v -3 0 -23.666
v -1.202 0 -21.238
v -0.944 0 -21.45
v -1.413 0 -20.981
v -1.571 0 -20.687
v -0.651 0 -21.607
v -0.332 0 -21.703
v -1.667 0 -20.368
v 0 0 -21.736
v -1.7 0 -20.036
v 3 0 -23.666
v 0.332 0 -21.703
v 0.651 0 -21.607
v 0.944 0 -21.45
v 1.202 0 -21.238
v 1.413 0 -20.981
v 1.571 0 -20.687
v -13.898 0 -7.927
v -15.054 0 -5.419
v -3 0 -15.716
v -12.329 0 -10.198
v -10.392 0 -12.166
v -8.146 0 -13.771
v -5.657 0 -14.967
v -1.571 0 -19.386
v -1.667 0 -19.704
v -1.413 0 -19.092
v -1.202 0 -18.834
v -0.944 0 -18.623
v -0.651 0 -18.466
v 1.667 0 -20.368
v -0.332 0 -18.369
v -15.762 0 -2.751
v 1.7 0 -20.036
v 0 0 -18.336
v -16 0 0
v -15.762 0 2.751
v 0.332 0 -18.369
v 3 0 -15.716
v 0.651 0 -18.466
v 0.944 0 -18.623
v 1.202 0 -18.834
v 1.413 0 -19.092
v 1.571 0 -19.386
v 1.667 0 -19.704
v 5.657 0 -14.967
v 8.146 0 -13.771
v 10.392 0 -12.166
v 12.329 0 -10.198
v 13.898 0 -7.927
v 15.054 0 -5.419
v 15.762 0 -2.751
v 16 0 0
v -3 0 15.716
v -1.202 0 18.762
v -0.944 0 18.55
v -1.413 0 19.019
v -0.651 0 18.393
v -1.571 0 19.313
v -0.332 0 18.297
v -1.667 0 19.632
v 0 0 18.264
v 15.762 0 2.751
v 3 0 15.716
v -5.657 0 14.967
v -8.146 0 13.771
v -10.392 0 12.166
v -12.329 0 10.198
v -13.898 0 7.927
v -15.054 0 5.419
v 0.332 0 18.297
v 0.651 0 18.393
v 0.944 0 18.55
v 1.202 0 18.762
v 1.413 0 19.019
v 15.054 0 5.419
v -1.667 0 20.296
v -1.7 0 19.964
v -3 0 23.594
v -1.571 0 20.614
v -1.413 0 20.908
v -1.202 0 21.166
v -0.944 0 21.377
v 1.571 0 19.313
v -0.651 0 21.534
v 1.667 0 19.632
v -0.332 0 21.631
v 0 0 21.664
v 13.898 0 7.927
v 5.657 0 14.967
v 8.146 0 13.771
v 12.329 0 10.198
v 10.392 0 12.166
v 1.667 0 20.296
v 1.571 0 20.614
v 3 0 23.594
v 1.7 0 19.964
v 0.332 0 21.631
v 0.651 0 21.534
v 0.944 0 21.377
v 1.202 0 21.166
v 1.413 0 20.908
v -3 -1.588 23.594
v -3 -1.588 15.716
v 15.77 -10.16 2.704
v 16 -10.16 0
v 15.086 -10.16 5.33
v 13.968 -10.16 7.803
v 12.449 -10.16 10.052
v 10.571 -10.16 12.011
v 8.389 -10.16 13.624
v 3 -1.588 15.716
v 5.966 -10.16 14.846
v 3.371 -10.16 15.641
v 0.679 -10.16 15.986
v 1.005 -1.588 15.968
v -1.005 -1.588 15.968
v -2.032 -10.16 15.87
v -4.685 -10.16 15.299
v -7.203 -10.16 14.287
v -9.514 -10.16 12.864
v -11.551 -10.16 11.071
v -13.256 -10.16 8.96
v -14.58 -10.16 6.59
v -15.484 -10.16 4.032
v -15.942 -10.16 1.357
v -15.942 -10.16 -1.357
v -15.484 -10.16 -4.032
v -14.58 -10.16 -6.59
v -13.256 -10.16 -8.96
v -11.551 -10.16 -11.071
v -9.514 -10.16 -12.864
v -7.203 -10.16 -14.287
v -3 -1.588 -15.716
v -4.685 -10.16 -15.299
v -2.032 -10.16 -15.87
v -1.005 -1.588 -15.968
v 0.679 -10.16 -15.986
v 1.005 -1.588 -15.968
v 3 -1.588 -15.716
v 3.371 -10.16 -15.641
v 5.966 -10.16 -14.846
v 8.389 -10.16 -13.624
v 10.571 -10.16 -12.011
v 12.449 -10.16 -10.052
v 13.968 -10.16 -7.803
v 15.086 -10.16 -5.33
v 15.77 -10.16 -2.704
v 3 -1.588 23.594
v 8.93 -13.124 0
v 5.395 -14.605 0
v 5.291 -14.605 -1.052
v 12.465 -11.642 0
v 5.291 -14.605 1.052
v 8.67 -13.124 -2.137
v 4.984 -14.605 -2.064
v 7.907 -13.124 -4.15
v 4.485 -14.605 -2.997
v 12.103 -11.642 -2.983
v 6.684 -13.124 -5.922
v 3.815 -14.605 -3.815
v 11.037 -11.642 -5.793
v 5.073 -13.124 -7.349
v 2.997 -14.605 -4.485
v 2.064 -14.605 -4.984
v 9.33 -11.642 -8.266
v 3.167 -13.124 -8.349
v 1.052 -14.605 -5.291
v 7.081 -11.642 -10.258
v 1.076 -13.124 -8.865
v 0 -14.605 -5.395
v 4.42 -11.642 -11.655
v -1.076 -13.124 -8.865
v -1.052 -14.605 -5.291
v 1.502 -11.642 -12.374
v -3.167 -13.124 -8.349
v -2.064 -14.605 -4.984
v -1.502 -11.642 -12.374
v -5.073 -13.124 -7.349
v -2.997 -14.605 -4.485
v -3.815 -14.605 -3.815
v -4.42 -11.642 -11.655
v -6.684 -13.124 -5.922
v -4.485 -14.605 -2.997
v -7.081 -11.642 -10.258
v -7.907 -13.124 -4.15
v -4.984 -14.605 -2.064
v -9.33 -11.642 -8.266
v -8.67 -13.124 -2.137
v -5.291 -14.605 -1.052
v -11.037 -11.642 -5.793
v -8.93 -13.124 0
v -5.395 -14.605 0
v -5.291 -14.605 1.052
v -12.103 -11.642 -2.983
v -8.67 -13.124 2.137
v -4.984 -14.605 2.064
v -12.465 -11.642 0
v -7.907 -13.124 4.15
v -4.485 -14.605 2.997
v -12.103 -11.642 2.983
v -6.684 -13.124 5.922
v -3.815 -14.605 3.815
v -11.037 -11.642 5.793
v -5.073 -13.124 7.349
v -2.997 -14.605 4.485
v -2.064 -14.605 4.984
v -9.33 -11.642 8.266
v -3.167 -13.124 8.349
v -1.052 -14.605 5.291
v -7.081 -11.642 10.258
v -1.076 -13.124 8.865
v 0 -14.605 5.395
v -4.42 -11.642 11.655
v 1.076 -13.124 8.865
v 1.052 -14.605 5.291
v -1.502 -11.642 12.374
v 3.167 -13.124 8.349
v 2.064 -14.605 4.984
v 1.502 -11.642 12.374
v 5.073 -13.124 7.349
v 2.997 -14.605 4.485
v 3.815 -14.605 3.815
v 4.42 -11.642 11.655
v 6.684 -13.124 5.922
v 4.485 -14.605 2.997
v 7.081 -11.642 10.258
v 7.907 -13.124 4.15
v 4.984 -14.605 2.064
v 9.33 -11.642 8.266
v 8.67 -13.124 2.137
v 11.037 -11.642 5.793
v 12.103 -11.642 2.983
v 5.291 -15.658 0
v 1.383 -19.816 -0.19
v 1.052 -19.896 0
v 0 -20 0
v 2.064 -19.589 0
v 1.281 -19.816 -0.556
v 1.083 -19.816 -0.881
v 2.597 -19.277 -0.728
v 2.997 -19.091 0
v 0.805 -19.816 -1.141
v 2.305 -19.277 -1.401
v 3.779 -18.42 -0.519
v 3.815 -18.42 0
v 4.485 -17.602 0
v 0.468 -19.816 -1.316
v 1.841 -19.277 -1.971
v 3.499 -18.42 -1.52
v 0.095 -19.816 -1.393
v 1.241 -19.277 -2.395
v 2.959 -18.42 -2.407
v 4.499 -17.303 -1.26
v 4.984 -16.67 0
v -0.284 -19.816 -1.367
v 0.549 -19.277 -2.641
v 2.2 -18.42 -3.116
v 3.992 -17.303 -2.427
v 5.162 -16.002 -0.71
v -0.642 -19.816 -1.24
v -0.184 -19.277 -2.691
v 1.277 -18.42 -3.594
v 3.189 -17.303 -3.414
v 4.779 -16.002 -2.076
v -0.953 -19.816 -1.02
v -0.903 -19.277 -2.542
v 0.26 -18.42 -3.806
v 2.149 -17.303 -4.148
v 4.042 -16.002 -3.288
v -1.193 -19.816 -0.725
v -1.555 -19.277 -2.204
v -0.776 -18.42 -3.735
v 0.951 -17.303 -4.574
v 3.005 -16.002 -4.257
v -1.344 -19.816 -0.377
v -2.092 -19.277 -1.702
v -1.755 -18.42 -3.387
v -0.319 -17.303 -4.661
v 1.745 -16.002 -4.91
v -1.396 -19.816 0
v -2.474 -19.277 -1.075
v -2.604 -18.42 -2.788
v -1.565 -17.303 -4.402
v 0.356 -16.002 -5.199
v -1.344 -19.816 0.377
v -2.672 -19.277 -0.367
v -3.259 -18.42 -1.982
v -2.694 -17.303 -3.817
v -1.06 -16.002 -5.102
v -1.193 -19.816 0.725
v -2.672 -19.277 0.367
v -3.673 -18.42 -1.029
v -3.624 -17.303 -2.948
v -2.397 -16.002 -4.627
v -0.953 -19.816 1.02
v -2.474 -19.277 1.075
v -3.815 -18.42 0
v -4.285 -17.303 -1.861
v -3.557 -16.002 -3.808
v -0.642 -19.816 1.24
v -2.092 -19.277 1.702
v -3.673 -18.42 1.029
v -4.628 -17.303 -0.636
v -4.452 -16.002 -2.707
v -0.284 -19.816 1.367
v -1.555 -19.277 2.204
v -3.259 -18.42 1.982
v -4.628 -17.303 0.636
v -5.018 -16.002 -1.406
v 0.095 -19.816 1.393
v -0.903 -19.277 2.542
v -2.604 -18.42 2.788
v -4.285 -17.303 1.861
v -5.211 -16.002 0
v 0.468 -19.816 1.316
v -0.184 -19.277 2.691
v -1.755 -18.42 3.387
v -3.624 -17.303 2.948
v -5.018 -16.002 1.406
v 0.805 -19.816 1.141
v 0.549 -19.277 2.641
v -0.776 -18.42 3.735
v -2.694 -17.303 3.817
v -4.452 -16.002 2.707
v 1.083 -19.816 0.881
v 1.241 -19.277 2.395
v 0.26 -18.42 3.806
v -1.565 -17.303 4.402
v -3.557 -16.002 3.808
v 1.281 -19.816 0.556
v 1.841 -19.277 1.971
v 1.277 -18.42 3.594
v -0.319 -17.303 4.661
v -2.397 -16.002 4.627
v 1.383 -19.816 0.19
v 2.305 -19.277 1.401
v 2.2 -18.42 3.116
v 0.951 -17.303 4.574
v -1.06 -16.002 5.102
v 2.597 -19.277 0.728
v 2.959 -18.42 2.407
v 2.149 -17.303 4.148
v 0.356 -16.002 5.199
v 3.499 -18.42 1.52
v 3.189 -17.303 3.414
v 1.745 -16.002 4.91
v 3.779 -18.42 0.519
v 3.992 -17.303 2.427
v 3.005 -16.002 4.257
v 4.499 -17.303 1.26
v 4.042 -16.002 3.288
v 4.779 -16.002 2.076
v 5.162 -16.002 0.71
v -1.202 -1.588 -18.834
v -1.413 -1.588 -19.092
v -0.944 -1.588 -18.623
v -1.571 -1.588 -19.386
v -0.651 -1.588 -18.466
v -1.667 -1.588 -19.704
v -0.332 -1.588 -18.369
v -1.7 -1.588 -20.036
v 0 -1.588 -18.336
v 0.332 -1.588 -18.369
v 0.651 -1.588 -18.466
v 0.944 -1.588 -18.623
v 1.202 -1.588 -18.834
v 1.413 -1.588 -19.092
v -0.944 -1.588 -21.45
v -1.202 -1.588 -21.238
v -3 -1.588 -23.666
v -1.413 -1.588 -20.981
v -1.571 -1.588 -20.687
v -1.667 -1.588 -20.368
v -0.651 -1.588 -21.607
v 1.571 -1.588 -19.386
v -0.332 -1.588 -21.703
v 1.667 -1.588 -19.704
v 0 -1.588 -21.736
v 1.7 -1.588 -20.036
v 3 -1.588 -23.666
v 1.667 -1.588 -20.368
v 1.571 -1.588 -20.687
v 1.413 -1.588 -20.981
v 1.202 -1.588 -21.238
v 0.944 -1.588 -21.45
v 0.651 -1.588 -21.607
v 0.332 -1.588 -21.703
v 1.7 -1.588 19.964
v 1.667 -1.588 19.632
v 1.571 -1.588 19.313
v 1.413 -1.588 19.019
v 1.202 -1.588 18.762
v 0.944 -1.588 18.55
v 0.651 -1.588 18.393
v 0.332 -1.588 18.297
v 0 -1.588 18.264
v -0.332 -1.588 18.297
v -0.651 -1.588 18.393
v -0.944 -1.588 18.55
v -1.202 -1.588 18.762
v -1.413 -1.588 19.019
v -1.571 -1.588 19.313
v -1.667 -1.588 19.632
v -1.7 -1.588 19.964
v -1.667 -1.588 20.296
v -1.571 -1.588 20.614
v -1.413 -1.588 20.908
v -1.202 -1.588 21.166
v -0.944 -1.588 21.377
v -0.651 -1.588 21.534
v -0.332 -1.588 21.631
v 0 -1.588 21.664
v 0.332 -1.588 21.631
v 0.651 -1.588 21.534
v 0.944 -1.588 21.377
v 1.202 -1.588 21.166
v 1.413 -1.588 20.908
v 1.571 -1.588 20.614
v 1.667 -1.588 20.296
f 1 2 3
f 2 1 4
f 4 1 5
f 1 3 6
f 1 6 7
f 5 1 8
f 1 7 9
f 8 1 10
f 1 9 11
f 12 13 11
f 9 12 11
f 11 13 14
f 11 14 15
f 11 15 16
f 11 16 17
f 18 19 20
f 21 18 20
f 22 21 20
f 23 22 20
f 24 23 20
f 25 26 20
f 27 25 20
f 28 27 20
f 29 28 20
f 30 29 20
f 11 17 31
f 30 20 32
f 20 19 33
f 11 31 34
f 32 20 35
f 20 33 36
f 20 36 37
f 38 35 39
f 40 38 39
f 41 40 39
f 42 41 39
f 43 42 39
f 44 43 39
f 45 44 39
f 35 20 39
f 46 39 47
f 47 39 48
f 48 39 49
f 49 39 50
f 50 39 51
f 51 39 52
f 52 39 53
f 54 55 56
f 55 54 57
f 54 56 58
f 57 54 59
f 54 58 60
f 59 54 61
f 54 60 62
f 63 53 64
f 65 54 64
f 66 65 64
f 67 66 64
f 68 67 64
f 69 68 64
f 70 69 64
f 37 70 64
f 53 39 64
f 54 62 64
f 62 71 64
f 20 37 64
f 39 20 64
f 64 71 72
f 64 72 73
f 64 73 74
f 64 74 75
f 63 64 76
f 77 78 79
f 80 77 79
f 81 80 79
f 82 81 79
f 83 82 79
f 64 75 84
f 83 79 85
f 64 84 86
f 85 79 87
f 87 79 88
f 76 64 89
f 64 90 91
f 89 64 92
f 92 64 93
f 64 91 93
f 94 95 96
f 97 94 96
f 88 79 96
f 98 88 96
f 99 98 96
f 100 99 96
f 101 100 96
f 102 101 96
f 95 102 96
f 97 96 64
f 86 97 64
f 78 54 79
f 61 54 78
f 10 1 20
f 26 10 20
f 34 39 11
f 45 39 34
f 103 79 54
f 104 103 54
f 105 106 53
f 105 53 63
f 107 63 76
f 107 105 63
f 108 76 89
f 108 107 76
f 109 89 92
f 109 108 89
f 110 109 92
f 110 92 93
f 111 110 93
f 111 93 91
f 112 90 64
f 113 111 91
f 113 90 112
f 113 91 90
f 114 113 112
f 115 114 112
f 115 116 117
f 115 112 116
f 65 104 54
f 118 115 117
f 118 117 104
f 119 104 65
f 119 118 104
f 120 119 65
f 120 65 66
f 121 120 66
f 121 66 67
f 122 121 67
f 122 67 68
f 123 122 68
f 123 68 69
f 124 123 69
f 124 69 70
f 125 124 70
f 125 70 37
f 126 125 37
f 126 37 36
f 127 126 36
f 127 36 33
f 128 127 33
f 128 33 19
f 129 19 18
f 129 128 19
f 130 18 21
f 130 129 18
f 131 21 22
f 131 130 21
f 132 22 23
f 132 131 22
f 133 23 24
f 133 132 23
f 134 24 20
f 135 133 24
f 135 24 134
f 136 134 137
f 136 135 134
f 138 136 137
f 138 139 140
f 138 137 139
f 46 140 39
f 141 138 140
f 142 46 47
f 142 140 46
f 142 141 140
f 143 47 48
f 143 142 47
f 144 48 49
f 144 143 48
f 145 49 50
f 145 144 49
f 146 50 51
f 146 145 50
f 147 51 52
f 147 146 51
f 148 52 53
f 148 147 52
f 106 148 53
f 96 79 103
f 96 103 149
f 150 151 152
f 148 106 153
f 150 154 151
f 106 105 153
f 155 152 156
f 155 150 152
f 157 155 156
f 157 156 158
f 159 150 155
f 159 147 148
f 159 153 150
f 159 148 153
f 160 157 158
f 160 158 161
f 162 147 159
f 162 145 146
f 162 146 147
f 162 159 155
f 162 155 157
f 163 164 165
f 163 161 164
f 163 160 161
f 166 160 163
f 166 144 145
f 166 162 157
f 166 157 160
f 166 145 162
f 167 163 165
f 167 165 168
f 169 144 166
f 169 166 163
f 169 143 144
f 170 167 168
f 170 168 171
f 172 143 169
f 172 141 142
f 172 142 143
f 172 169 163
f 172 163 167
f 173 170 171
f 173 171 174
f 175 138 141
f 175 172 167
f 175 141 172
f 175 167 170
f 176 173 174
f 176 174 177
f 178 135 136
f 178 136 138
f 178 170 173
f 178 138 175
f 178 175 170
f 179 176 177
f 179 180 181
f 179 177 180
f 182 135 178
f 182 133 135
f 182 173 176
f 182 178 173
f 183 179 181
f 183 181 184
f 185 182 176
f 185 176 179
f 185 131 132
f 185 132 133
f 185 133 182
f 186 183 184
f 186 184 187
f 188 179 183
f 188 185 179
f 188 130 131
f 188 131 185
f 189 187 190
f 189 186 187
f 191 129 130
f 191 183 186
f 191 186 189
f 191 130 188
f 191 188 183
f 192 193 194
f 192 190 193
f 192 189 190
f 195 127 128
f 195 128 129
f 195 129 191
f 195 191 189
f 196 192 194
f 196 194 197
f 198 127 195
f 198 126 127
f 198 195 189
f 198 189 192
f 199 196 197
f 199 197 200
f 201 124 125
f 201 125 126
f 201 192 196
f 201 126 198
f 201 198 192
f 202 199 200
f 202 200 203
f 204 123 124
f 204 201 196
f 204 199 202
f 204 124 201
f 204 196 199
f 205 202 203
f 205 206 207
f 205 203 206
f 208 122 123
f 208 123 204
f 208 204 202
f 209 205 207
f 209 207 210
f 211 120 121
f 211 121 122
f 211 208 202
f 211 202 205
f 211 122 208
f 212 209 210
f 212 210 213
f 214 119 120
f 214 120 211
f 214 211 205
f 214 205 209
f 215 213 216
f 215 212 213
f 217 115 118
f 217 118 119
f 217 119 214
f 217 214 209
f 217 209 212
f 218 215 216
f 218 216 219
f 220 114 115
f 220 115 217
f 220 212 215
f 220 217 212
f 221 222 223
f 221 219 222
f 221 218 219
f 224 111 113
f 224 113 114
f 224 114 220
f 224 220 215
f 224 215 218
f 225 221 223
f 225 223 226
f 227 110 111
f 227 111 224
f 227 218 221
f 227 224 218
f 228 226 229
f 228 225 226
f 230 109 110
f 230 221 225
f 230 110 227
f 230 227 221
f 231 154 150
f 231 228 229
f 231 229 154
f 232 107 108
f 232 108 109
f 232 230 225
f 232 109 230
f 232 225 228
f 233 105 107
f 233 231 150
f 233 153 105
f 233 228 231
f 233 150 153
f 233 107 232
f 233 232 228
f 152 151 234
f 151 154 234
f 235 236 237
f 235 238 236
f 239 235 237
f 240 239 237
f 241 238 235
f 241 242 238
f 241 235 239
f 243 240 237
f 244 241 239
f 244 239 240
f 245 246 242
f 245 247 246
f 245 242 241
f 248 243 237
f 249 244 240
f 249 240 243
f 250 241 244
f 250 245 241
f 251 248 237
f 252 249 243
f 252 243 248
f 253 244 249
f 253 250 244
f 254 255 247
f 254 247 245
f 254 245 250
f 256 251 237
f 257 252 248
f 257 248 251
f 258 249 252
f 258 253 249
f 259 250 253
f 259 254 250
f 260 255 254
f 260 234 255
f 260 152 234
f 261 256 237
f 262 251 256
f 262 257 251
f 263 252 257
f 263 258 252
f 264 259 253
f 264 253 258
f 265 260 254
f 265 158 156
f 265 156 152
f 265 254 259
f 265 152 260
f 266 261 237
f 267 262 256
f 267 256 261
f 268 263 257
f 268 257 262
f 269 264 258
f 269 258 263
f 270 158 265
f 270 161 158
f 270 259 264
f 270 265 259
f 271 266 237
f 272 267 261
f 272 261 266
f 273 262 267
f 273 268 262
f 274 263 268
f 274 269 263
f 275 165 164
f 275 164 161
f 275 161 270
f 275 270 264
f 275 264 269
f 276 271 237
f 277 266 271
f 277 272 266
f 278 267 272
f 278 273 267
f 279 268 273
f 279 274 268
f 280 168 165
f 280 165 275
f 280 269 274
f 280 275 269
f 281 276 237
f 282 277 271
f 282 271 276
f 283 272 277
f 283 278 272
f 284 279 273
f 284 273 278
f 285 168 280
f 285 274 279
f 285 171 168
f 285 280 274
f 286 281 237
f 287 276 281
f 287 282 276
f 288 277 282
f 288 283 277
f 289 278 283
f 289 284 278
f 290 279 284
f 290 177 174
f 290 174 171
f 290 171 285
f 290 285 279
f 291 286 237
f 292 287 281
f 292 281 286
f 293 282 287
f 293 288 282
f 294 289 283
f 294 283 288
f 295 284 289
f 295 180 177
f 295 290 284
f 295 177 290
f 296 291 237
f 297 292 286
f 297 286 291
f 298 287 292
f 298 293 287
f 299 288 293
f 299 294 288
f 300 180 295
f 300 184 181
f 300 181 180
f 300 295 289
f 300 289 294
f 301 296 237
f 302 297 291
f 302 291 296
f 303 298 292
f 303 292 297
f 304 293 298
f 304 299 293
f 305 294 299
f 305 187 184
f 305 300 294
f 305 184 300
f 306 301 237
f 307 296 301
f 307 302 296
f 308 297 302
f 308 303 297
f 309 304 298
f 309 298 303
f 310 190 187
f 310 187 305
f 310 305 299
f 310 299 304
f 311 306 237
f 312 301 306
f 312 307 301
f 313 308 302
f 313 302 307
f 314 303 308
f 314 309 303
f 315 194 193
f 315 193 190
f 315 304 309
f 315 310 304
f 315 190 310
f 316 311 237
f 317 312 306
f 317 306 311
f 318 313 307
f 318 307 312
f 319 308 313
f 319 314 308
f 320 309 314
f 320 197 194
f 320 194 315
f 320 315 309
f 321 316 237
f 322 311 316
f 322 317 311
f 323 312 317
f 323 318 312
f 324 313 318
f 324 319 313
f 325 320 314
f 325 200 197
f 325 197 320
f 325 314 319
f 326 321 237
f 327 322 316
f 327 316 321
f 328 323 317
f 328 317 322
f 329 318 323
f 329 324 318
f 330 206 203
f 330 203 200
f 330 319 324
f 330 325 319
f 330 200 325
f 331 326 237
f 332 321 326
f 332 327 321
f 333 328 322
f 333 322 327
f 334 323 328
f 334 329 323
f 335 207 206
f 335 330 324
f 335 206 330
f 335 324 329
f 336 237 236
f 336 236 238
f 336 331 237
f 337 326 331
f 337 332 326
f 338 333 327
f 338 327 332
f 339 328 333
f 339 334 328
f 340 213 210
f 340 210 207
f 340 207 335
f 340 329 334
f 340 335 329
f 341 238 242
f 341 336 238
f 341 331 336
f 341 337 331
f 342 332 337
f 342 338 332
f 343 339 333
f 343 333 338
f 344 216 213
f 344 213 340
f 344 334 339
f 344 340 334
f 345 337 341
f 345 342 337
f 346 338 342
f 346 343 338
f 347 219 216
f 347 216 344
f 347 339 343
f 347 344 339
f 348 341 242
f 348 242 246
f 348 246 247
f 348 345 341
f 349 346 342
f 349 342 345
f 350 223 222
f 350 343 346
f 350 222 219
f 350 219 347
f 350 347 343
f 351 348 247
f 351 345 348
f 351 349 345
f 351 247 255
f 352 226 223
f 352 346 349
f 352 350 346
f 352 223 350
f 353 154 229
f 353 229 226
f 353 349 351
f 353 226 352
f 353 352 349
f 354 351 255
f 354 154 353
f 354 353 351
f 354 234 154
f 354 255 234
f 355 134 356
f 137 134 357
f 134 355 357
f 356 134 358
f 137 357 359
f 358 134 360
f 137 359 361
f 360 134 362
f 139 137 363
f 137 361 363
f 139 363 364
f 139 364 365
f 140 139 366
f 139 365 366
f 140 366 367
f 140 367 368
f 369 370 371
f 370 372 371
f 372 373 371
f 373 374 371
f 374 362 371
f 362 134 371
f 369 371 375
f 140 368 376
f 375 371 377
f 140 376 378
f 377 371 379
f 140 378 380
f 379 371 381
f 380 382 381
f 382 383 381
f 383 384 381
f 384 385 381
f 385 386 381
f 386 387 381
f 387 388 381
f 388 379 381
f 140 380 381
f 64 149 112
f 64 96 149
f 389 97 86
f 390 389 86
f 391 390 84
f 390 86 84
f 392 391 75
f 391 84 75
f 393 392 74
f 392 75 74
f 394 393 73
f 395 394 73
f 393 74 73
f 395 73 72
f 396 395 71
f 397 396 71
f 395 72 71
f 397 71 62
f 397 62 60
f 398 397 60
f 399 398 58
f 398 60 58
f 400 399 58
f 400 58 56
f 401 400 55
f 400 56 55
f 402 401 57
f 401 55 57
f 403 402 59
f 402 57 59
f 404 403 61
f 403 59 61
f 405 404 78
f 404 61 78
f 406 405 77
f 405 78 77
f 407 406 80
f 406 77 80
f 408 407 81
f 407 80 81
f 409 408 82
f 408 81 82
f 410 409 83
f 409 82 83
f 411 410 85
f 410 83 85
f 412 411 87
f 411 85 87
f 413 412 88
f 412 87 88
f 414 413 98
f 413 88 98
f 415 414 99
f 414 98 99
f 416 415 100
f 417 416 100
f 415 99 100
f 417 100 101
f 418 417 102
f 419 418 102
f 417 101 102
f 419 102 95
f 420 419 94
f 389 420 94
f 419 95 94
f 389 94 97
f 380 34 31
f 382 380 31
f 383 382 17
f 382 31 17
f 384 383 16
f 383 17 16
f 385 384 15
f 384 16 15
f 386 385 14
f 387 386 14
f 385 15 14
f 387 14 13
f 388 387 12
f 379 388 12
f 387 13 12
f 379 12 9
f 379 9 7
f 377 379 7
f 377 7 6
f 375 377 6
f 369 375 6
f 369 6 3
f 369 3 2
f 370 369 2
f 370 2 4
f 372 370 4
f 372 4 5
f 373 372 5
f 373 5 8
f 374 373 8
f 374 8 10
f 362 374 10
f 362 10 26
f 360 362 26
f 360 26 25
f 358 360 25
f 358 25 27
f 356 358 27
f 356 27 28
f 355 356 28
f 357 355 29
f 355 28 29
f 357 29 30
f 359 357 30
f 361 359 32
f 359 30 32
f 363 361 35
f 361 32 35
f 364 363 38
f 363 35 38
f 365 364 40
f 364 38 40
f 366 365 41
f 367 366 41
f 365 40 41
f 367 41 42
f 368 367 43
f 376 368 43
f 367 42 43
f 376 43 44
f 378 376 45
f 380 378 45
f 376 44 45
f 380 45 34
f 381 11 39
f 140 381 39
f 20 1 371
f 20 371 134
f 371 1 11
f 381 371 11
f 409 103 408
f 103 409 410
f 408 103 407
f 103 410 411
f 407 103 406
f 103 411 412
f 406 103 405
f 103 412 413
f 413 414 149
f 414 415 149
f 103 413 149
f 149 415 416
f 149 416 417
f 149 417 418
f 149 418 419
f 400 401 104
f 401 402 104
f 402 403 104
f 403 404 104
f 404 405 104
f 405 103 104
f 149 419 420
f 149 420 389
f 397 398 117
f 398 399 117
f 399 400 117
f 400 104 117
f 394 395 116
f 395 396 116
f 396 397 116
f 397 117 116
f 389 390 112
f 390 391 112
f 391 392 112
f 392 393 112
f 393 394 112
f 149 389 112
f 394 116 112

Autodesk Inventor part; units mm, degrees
ref_plane "YZ Plane" through (0, 0, 0) normal (1, 0, 0) x (0, 1, 0)
ref_plane "XZ Plane" through (0, 0, 0) normal (0, 1, 0) x (-1, 0, 0)
ref_plane "XY Plane" through (0, 0, 0) normal (0, 0, 1) x (1, 0, 0)
sketch "Sketch1" plane through (0, 0, 0) normal (0, 0, 1) x (1, 0, 0)
  line L0 (0, 0) -> (16, 0)
  line L1 (16, 0) -> (16, -10.16)
  line L2 (0, 0) -> (0, -20)
  arc A0 (0, -20) -> (5.3946, -14.6054) centre (0, -14.6054) ccw
  line L3 (0, -14.6054) -> (5.3946, -14.6054) construction
  line L4 (0, -14.6054) -> (0, -20) construction
  line L5 (5.3946, -14.6054) -> (16, -10.16)
  dimension "d0" = 16
  dimension "d1" = 20
  dimension "d2" = 10.16
  dimension "d3" = 90
  dimension "d4" = 5.3946
revolve "Revolution1" add sketch "Sketch1" angle 360 about axis through (0, 0, 0) along (0, -1, 0)
sketch "Sketch2" plane through (0, 0, 0) normal (0, 1, 0) x (1, 0, 0)
  circle A0 centre (0, 20.0361) radius 1.7
  circle A1 centre (0, -19.9639) radius 1.7
  line L0 (0, 24.0573) -> (0, -23.8232) construction
  line L1 (-3, 23.6661) -> (-3, 15.7162)
  line L2 (3, 23.6661) -> (3, 15.7162)
  line L3 (-3, 23.6661) -> (3, 23.6661)
  line L4 (-3, -23.5939) -> (-3, -15.7162)
  line L5 (3, -23.5939) -> (3, -15.7162)
  line L6 (-3, -23.5939) -> (3, -23.5939)
  circle A2 centre (0, 0) radius 16 projected
  circle A3 centre (0, 0) radius 16
  dimension "d6" = 3.4
  dimension "d7" = 3.4
  dimension "d8" = 40
  dimension "d10" = 3
  dimension "d11" = 3
  dimension "d12" = 3.63
  dimension "d13" = 3
  dimension "d14" = 3
  dimension "d15" = 3.63
  dimension "d18" = 32
extrude "Extrusion1" add sketch "Sketch2" against normal blind 1.5875 contours L3 L2 A2 L1 | A2 L5 L6 L4
equation "\"d6\" = m3_clearance"
equation "\"d7\" = m3_clearance"
equation "\"d13\" = d11"
equation "\"d14\" = d13"
equation "\"d15\" = d12"
equation "\"m3_heat_set_insert\" = 4"
equation "\"m3_clearance\" = 3.4"
equation "\"m3_heat_set_depth\" = 7"
equation "\"robot_diameter\" = 354"
equation "\"hardboard_thickness\" = 5"
equation "\"motor_centerline_height\" = 13"
properties part number "ball_caster"
